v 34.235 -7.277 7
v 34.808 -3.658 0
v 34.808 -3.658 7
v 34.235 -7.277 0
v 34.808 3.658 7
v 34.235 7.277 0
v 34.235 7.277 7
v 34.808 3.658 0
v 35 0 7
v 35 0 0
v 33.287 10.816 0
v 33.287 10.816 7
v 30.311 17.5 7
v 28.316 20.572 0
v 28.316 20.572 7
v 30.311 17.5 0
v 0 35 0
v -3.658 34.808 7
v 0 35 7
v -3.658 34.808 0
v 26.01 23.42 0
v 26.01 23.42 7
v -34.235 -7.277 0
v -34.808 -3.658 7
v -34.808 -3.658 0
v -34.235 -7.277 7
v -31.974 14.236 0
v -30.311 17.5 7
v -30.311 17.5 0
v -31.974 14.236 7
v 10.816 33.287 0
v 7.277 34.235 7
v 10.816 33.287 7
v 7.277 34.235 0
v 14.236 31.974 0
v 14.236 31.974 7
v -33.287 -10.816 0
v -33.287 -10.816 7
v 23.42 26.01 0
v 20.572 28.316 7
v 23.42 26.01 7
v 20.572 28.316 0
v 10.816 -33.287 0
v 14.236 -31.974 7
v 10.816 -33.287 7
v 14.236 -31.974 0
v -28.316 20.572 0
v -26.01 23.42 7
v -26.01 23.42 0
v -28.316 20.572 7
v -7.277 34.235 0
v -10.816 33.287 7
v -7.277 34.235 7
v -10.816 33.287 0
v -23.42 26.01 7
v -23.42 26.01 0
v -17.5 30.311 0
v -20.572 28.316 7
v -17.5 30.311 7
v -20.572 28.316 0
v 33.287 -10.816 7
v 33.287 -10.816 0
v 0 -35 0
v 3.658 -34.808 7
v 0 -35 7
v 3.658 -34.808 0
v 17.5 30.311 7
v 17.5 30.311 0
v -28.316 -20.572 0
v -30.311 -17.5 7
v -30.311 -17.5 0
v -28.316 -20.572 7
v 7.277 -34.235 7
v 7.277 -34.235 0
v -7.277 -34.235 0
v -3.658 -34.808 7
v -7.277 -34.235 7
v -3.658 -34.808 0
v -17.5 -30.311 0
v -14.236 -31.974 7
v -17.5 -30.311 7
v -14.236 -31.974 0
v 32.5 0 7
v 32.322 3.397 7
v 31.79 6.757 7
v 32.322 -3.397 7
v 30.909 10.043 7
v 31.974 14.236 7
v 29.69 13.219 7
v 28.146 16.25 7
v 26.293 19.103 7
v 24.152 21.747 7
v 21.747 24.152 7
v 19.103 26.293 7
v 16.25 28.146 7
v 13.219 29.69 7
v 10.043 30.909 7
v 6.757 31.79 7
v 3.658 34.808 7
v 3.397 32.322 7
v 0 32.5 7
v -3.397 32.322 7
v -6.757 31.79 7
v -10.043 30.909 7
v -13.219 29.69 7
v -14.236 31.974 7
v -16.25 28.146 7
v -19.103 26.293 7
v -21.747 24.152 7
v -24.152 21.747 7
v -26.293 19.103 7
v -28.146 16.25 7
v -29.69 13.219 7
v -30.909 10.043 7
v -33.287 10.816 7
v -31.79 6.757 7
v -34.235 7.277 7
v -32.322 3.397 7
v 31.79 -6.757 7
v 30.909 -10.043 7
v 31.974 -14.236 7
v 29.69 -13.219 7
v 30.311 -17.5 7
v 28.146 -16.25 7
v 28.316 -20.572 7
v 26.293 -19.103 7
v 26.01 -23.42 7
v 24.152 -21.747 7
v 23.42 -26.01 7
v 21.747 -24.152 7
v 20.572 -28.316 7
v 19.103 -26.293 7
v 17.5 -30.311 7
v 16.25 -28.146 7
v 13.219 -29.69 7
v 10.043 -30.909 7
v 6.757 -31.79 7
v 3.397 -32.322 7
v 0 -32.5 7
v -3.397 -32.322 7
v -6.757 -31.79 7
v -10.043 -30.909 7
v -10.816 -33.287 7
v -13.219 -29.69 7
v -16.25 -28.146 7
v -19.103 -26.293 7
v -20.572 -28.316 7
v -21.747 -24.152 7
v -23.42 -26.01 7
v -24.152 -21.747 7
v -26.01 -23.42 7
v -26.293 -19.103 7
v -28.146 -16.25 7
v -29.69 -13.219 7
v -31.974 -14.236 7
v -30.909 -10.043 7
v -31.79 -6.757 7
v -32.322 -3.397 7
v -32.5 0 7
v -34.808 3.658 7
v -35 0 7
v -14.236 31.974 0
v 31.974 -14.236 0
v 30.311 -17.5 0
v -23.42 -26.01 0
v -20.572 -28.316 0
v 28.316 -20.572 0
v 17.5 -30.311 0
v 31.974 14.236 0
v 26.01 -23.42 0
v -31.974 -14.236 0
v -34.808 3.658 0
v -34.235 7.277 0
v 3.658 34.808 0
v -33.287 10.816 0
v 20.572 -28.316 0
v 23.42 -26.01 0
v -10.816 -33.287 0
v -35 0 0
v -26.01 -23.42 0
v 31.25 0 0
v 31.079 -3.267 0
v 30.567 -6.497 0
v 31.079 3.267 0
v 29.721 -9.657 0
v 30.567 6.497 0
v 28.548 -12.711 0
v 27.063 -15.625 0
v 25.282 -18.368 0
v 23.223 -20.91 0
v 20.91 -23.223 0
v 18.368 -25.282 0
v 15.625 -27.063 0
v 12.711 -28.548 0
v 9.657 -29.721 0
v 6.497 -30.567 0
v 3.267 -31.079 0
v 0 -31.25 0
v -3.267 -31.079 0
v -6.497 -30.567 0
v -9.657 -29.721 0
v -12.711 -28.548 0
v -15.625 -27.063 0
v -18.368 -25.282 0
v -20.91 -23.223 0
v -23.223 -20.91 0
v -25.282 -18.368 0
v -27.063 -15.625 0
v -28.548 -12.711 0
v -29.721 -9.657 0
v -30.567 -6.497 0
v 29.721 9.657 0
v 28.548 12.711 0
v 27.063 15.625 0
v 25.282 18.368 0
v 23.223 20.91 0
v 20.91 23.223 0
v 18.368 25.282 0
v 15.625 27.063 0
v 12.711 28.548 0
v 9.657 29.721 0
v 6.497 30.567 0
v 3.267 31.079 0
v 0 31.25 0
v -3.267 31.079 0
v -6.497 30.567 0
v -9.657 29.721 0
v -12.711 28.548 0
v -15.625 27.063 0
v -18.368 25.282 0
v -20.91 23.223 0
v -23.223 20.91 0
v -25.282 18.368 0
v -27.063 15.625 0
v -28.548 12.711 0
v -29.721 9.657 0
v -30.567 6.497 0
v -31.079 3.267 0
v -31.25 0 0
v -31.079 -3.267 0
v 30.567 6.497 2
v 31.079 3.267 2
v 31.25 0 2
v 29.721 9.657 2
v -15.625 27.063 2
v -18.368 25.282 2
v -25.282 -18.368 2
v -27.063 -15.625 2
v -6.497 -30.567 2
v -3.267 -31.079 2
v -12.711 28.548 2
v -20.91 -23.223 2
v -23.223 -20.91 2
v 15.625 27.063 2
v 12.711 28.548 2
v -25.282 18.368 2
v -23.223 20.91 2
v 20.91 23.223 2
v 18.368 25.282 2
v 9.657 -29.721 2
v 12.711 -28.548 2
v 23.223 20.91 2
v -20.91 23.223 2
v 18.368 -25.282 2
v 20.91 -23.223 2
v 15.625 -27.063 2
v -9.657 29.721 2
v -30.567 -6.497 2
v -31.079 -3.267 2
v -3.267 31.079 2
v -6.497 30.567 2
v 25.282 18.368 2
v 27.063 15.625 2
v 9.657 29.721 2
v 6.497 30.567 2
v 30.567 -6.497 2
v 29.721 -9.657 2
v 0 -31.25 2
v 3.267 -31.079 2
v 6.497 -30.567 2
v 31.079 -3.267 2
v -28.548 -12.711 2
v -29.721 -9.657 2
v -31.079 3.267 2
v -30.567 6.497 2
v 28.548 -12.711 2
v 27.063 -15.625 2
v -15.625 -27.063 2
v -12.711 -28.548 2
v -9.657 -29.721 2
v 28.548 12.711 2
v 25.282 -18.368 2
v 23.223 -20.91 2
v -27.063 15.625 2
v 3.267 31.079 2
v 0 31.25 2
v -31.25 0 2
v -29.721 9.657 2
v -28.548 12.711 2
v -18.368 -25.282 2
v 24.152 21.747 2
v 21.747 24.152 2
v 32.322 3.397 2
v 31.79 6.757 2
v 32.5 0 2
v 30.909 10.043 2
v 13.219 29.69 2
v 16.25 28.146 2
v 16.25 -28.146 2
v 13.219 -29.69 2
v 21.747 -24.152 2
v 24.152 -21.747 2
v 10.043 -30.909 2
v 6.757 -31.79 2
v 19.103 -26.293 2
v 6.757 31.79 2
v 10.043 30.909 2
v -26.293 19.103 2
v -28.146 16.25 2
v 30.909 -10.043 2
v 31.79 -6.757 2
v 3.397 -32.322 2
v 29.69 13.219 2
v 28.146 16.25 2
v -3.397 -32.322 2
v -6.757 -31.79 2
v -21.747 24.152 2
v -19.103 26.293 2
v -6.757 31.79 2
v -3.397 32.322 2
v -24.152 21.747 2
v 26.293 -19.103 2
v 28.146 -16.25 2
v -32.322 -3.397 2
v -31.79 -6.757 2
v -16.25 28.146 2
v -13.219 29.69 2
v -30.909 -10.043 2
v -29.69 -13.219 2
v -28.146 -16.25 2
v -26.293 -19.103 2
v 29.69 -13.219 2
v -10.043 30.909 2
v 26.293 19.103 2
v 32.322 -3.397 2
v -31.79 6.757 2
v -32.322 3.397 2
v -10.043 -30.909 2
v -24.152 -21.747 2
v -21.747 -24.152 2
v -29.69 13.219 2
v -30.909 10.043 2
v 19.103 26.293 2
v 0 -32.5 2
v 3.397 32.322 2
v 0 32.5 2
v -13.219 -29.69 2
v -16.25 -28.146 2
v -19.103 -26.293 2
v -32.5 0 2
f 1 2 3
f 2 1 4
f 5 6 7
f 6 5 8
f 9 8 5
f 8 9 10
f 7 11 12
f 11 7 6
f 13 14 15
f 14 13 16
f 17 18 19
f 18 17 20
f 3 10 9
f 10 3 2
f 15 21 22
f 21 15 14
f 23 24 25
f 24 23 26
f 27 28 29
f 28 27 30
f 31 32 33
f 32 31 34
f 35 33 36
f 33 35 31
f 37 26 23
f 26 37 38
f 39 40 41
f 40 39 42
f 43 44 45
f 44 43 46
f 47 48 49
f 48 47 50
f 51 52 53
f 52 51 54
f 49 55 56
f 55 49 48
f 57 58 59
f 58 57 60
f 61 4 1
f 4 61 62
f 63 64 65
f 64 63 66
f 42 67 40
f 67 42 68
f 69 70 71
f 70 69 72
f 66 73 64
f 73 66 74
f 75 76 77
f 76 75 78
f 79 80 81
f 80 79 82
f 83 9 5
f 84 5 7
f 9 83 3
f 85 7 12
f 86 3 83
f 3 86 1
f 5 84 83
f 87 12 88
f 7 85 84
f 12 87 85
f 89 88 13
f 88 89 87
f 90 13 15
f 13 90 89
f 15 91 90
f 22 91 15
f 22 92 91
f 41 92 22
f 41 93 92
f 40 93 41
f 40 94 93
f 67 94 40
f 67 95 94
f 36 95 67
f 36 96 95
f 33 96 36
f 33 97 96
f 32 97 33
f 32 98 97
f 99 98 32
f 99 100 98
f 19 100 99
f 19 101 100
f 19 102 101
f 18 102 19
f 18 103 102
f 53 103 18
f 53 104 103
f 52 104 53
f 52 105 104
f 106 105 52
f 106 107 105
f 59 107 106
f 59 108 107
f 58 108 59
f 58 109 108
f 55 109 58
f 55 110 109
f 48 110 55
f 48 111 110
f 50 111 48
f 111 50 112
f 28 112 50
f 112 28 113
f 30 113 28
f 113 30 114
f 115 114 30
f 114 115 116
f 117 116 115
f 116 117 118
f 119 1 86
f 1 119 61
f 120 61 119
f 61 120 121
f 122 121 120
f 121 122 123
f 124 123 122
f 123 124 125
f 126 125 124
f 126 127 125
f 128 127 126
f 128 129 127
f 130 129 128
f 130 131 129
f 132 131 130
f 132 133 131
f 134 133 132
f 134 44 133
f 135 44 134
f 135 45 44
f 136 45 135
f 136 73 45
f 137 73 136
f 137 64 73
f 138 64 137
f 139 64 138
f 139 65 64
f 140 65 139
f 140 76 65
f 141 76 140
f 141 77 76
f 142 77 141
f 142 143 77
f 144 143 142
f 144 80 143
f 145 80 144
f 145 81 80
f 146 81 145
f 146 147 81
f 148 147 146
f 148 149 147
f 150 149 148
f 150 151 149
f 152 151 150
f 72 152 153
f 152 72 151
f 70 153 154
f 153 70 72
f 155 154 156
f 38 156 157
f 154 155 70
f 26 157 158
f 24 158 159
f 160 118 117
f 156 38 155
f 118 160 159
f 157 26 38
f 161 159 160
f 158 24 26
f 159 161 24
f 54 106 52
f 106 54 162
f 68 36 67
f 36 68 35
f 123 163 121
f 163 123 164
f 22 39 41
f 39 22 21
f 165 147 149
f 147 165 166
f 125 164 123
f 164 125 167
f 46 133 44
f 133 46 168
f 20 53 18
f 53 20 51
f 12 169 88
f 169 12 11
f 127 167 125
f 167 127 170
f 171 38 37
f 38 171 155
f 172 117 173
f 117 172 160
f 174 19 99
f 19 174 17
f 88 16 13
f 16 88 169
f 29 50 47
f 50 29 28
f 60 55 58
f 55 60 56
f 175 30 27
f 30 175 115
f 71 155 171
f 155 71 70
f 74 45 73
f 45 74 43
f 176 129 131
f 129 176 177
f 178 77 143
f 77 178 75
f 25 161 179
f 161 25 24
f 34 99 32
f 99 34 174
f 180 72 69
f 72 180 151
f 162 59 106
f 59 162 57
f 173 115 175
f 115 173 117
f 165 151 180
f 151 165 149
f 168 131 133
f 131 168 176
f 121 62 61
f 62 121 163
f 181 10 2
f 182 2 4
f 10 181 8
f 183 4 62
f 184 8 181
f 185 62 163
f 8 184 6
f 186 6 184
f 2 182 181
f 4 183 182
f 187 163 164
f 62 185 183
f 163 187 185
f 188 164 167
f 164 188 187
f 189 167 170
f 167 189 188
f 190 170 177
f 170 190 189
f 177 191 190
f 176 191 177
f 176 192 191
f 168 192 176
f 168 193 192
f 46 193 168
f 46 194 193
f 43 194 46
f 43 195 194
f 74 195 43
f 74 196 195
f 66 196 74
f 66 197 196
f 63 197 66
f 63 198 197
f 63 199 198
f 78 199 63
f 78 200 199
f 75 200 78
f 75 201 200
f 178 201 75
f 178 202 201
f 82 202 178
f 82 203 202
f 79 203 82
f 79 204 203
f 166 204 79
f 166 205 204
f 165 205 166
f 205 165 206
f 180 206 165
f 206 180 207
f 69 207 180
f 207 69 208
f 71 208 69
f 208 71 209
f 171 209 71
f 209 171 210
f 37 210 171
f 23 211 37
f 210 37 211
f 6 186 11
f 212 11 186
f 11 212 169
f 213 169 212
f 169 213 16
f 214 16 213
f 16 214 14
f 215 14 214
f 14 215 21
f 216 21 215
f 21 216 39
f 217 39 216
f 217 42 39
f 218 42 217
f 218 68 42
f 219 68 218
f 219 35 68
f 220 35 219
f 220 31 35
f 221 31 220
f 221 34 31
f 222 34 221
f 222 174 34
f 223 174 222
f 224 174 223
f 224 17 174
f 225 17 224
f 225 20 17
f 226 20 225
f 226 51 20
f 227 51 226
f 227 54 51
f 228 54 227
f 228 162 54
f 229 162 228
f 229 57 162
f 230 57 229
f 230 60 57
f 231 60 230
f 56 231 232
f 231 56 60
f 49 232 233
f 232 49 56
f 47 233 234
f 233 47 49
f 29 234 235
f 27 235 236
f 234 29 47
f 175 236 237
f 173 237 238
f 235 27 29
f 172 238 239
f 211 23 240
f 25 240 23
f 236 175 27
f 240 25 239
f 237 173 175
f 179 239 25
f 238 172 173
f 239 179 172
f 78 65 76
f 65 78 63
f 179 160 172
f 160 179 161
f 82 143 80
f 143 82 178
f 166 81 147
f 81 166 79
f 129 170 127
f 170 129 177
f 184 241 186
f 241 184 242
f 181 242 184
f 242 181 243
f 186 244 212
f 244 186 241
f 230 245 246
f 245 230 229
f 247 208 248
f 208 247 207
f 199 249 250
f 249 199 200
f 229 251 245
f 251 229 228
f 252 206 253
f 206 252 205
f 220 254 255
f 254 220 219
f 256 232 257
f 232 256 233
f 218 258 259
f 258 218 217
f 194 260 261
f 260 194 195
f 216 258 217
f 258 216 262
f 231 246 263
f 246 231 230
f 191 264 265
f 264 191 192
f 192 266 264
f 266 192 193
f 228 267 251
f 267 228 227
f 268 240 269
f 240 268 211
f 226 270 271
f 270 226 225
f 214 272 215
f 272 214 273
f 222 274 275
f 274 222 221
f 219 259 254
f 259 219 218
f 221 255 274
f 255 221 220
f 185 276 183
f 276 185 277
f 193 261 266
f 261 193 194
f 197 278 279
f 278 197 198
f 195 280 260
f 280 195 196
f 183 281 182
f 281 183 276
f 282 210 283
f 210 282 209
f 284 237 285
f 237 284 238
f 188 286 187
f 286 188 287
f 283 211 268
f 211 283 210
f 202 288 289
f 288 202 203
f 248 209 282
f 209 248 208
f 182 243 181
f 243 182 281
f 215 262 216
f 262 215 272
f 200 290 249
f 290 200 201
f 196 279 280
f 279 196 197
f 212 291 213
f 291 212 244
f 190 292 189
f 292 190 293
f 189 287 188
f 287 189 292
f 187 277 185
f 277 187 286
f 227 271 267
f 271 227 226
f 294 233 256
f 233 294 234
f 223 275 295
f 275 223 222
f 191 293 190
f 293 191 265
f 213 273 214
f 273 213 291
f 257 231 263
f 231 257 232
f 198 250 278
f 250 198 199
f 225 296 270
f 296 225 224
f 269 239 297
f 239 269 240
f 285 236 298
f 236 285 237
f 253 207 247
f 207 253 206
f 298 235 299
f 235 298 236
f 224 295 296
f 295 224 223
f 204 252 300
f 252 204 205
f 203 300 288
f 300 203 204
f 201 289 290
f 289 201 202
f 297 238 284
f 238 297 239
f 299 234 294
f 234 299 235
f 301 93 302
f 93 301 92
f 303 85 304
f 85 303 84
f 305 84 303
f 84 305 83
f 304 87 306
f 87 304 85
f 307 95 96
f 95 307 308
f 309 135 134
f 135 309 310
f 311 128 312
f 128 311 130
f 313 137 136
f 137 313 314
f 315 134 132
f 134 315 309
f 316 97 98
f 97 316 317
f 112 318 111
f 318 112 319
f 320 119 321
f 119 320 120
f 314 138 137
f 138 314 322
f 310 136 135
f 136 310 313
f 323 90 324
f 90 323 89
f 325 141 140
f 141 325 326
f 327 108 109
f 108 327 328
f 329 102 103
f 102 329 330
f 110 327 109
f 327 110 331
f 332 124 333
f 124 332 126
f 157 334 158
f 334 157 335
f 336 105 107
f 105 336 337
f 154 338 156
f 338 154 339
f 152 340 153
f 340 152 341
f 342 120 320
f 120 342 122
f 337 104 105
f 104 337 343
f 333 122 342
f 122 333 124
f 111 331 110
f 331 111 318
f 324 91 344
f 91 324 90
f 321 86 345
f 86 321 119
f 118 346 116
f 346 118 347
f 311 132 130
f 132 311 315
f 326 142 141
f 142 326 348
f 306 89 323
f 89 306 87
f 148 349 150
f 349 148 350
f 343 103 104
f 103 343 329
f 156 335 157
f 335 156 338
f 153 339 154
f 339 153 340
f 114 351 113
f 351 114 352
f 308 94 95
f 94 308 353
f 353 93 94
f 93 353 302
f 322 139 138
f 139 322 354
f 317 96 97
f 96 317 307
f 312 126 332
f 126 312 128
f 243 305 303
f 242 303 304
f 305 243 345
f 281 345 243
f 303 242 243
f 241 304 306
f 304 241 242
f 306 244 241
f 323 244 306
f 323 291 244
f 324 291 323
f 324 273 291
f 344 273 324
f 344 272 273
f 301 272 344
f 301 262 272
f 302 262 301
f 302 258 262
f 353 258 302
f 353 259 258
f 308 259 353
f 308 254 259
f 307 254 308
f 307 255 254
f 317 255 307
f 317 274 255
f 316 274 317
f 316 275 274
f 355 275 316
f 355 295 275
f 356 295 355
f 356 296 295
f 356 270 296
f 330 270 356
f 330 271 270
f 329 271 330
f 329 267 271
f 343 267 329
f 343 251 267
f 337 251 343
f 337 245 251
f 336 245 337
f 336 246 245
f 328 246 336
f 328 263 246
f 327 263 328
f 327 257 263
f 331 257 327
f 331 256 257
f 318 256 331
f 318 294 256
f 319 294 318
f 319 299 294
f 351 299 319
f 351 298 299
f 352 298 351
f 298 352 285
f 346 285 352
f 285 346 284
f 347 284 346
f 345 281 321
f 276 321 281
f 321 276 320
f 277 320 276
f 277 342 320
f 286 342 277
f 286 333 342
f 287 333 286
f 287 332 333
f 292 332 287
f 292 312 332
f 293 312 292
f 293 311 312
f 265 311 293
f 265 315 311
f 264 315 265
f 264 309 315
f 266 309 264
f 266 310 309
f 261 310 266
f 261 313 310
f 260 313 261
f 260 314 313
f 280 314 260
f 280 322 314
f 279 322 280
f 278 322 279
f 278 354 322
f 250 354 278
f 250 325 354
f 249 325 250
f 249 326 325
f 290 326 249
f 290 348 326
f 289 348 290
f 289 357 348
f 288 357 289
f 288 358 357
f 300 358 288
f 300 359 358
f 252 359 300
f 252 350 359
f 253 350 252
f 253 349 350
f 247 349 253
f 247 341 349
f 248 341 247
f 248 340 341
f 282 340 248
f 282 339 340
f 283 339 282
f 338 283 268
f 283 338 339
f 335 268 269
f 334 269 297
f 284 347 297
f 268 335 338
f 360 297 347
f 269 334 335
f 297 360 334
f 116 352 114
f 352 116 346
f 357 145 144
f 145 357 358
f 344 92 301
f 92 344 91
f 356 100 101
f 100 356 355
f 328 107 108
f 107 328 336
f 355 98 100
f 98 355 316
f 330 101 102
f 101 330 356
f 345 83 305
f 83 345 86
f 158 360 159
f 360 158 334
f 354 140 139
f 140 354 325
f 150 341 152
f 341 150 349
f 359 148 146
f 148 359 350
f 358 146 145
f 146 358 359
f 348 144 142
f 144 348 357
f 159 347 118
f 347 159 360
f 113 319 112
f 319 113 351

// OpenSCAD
$fn = 60;
inner_diameter = 65;
rim_thickness = 5;
tire_diameter = 5; // added to total diameter


difference(){
    cylinder(h = rim_thickness+2, r = (inner_diameter+tire_diameter)/2);
    cylinder(h = rim_thickness, r = (inner_diameter-tire_diameter/2)/2);
   
    translate([0, 0, 2]){
            cylinder(h = rim_thickness, r = (inner_diameter)/2);
     }
}
